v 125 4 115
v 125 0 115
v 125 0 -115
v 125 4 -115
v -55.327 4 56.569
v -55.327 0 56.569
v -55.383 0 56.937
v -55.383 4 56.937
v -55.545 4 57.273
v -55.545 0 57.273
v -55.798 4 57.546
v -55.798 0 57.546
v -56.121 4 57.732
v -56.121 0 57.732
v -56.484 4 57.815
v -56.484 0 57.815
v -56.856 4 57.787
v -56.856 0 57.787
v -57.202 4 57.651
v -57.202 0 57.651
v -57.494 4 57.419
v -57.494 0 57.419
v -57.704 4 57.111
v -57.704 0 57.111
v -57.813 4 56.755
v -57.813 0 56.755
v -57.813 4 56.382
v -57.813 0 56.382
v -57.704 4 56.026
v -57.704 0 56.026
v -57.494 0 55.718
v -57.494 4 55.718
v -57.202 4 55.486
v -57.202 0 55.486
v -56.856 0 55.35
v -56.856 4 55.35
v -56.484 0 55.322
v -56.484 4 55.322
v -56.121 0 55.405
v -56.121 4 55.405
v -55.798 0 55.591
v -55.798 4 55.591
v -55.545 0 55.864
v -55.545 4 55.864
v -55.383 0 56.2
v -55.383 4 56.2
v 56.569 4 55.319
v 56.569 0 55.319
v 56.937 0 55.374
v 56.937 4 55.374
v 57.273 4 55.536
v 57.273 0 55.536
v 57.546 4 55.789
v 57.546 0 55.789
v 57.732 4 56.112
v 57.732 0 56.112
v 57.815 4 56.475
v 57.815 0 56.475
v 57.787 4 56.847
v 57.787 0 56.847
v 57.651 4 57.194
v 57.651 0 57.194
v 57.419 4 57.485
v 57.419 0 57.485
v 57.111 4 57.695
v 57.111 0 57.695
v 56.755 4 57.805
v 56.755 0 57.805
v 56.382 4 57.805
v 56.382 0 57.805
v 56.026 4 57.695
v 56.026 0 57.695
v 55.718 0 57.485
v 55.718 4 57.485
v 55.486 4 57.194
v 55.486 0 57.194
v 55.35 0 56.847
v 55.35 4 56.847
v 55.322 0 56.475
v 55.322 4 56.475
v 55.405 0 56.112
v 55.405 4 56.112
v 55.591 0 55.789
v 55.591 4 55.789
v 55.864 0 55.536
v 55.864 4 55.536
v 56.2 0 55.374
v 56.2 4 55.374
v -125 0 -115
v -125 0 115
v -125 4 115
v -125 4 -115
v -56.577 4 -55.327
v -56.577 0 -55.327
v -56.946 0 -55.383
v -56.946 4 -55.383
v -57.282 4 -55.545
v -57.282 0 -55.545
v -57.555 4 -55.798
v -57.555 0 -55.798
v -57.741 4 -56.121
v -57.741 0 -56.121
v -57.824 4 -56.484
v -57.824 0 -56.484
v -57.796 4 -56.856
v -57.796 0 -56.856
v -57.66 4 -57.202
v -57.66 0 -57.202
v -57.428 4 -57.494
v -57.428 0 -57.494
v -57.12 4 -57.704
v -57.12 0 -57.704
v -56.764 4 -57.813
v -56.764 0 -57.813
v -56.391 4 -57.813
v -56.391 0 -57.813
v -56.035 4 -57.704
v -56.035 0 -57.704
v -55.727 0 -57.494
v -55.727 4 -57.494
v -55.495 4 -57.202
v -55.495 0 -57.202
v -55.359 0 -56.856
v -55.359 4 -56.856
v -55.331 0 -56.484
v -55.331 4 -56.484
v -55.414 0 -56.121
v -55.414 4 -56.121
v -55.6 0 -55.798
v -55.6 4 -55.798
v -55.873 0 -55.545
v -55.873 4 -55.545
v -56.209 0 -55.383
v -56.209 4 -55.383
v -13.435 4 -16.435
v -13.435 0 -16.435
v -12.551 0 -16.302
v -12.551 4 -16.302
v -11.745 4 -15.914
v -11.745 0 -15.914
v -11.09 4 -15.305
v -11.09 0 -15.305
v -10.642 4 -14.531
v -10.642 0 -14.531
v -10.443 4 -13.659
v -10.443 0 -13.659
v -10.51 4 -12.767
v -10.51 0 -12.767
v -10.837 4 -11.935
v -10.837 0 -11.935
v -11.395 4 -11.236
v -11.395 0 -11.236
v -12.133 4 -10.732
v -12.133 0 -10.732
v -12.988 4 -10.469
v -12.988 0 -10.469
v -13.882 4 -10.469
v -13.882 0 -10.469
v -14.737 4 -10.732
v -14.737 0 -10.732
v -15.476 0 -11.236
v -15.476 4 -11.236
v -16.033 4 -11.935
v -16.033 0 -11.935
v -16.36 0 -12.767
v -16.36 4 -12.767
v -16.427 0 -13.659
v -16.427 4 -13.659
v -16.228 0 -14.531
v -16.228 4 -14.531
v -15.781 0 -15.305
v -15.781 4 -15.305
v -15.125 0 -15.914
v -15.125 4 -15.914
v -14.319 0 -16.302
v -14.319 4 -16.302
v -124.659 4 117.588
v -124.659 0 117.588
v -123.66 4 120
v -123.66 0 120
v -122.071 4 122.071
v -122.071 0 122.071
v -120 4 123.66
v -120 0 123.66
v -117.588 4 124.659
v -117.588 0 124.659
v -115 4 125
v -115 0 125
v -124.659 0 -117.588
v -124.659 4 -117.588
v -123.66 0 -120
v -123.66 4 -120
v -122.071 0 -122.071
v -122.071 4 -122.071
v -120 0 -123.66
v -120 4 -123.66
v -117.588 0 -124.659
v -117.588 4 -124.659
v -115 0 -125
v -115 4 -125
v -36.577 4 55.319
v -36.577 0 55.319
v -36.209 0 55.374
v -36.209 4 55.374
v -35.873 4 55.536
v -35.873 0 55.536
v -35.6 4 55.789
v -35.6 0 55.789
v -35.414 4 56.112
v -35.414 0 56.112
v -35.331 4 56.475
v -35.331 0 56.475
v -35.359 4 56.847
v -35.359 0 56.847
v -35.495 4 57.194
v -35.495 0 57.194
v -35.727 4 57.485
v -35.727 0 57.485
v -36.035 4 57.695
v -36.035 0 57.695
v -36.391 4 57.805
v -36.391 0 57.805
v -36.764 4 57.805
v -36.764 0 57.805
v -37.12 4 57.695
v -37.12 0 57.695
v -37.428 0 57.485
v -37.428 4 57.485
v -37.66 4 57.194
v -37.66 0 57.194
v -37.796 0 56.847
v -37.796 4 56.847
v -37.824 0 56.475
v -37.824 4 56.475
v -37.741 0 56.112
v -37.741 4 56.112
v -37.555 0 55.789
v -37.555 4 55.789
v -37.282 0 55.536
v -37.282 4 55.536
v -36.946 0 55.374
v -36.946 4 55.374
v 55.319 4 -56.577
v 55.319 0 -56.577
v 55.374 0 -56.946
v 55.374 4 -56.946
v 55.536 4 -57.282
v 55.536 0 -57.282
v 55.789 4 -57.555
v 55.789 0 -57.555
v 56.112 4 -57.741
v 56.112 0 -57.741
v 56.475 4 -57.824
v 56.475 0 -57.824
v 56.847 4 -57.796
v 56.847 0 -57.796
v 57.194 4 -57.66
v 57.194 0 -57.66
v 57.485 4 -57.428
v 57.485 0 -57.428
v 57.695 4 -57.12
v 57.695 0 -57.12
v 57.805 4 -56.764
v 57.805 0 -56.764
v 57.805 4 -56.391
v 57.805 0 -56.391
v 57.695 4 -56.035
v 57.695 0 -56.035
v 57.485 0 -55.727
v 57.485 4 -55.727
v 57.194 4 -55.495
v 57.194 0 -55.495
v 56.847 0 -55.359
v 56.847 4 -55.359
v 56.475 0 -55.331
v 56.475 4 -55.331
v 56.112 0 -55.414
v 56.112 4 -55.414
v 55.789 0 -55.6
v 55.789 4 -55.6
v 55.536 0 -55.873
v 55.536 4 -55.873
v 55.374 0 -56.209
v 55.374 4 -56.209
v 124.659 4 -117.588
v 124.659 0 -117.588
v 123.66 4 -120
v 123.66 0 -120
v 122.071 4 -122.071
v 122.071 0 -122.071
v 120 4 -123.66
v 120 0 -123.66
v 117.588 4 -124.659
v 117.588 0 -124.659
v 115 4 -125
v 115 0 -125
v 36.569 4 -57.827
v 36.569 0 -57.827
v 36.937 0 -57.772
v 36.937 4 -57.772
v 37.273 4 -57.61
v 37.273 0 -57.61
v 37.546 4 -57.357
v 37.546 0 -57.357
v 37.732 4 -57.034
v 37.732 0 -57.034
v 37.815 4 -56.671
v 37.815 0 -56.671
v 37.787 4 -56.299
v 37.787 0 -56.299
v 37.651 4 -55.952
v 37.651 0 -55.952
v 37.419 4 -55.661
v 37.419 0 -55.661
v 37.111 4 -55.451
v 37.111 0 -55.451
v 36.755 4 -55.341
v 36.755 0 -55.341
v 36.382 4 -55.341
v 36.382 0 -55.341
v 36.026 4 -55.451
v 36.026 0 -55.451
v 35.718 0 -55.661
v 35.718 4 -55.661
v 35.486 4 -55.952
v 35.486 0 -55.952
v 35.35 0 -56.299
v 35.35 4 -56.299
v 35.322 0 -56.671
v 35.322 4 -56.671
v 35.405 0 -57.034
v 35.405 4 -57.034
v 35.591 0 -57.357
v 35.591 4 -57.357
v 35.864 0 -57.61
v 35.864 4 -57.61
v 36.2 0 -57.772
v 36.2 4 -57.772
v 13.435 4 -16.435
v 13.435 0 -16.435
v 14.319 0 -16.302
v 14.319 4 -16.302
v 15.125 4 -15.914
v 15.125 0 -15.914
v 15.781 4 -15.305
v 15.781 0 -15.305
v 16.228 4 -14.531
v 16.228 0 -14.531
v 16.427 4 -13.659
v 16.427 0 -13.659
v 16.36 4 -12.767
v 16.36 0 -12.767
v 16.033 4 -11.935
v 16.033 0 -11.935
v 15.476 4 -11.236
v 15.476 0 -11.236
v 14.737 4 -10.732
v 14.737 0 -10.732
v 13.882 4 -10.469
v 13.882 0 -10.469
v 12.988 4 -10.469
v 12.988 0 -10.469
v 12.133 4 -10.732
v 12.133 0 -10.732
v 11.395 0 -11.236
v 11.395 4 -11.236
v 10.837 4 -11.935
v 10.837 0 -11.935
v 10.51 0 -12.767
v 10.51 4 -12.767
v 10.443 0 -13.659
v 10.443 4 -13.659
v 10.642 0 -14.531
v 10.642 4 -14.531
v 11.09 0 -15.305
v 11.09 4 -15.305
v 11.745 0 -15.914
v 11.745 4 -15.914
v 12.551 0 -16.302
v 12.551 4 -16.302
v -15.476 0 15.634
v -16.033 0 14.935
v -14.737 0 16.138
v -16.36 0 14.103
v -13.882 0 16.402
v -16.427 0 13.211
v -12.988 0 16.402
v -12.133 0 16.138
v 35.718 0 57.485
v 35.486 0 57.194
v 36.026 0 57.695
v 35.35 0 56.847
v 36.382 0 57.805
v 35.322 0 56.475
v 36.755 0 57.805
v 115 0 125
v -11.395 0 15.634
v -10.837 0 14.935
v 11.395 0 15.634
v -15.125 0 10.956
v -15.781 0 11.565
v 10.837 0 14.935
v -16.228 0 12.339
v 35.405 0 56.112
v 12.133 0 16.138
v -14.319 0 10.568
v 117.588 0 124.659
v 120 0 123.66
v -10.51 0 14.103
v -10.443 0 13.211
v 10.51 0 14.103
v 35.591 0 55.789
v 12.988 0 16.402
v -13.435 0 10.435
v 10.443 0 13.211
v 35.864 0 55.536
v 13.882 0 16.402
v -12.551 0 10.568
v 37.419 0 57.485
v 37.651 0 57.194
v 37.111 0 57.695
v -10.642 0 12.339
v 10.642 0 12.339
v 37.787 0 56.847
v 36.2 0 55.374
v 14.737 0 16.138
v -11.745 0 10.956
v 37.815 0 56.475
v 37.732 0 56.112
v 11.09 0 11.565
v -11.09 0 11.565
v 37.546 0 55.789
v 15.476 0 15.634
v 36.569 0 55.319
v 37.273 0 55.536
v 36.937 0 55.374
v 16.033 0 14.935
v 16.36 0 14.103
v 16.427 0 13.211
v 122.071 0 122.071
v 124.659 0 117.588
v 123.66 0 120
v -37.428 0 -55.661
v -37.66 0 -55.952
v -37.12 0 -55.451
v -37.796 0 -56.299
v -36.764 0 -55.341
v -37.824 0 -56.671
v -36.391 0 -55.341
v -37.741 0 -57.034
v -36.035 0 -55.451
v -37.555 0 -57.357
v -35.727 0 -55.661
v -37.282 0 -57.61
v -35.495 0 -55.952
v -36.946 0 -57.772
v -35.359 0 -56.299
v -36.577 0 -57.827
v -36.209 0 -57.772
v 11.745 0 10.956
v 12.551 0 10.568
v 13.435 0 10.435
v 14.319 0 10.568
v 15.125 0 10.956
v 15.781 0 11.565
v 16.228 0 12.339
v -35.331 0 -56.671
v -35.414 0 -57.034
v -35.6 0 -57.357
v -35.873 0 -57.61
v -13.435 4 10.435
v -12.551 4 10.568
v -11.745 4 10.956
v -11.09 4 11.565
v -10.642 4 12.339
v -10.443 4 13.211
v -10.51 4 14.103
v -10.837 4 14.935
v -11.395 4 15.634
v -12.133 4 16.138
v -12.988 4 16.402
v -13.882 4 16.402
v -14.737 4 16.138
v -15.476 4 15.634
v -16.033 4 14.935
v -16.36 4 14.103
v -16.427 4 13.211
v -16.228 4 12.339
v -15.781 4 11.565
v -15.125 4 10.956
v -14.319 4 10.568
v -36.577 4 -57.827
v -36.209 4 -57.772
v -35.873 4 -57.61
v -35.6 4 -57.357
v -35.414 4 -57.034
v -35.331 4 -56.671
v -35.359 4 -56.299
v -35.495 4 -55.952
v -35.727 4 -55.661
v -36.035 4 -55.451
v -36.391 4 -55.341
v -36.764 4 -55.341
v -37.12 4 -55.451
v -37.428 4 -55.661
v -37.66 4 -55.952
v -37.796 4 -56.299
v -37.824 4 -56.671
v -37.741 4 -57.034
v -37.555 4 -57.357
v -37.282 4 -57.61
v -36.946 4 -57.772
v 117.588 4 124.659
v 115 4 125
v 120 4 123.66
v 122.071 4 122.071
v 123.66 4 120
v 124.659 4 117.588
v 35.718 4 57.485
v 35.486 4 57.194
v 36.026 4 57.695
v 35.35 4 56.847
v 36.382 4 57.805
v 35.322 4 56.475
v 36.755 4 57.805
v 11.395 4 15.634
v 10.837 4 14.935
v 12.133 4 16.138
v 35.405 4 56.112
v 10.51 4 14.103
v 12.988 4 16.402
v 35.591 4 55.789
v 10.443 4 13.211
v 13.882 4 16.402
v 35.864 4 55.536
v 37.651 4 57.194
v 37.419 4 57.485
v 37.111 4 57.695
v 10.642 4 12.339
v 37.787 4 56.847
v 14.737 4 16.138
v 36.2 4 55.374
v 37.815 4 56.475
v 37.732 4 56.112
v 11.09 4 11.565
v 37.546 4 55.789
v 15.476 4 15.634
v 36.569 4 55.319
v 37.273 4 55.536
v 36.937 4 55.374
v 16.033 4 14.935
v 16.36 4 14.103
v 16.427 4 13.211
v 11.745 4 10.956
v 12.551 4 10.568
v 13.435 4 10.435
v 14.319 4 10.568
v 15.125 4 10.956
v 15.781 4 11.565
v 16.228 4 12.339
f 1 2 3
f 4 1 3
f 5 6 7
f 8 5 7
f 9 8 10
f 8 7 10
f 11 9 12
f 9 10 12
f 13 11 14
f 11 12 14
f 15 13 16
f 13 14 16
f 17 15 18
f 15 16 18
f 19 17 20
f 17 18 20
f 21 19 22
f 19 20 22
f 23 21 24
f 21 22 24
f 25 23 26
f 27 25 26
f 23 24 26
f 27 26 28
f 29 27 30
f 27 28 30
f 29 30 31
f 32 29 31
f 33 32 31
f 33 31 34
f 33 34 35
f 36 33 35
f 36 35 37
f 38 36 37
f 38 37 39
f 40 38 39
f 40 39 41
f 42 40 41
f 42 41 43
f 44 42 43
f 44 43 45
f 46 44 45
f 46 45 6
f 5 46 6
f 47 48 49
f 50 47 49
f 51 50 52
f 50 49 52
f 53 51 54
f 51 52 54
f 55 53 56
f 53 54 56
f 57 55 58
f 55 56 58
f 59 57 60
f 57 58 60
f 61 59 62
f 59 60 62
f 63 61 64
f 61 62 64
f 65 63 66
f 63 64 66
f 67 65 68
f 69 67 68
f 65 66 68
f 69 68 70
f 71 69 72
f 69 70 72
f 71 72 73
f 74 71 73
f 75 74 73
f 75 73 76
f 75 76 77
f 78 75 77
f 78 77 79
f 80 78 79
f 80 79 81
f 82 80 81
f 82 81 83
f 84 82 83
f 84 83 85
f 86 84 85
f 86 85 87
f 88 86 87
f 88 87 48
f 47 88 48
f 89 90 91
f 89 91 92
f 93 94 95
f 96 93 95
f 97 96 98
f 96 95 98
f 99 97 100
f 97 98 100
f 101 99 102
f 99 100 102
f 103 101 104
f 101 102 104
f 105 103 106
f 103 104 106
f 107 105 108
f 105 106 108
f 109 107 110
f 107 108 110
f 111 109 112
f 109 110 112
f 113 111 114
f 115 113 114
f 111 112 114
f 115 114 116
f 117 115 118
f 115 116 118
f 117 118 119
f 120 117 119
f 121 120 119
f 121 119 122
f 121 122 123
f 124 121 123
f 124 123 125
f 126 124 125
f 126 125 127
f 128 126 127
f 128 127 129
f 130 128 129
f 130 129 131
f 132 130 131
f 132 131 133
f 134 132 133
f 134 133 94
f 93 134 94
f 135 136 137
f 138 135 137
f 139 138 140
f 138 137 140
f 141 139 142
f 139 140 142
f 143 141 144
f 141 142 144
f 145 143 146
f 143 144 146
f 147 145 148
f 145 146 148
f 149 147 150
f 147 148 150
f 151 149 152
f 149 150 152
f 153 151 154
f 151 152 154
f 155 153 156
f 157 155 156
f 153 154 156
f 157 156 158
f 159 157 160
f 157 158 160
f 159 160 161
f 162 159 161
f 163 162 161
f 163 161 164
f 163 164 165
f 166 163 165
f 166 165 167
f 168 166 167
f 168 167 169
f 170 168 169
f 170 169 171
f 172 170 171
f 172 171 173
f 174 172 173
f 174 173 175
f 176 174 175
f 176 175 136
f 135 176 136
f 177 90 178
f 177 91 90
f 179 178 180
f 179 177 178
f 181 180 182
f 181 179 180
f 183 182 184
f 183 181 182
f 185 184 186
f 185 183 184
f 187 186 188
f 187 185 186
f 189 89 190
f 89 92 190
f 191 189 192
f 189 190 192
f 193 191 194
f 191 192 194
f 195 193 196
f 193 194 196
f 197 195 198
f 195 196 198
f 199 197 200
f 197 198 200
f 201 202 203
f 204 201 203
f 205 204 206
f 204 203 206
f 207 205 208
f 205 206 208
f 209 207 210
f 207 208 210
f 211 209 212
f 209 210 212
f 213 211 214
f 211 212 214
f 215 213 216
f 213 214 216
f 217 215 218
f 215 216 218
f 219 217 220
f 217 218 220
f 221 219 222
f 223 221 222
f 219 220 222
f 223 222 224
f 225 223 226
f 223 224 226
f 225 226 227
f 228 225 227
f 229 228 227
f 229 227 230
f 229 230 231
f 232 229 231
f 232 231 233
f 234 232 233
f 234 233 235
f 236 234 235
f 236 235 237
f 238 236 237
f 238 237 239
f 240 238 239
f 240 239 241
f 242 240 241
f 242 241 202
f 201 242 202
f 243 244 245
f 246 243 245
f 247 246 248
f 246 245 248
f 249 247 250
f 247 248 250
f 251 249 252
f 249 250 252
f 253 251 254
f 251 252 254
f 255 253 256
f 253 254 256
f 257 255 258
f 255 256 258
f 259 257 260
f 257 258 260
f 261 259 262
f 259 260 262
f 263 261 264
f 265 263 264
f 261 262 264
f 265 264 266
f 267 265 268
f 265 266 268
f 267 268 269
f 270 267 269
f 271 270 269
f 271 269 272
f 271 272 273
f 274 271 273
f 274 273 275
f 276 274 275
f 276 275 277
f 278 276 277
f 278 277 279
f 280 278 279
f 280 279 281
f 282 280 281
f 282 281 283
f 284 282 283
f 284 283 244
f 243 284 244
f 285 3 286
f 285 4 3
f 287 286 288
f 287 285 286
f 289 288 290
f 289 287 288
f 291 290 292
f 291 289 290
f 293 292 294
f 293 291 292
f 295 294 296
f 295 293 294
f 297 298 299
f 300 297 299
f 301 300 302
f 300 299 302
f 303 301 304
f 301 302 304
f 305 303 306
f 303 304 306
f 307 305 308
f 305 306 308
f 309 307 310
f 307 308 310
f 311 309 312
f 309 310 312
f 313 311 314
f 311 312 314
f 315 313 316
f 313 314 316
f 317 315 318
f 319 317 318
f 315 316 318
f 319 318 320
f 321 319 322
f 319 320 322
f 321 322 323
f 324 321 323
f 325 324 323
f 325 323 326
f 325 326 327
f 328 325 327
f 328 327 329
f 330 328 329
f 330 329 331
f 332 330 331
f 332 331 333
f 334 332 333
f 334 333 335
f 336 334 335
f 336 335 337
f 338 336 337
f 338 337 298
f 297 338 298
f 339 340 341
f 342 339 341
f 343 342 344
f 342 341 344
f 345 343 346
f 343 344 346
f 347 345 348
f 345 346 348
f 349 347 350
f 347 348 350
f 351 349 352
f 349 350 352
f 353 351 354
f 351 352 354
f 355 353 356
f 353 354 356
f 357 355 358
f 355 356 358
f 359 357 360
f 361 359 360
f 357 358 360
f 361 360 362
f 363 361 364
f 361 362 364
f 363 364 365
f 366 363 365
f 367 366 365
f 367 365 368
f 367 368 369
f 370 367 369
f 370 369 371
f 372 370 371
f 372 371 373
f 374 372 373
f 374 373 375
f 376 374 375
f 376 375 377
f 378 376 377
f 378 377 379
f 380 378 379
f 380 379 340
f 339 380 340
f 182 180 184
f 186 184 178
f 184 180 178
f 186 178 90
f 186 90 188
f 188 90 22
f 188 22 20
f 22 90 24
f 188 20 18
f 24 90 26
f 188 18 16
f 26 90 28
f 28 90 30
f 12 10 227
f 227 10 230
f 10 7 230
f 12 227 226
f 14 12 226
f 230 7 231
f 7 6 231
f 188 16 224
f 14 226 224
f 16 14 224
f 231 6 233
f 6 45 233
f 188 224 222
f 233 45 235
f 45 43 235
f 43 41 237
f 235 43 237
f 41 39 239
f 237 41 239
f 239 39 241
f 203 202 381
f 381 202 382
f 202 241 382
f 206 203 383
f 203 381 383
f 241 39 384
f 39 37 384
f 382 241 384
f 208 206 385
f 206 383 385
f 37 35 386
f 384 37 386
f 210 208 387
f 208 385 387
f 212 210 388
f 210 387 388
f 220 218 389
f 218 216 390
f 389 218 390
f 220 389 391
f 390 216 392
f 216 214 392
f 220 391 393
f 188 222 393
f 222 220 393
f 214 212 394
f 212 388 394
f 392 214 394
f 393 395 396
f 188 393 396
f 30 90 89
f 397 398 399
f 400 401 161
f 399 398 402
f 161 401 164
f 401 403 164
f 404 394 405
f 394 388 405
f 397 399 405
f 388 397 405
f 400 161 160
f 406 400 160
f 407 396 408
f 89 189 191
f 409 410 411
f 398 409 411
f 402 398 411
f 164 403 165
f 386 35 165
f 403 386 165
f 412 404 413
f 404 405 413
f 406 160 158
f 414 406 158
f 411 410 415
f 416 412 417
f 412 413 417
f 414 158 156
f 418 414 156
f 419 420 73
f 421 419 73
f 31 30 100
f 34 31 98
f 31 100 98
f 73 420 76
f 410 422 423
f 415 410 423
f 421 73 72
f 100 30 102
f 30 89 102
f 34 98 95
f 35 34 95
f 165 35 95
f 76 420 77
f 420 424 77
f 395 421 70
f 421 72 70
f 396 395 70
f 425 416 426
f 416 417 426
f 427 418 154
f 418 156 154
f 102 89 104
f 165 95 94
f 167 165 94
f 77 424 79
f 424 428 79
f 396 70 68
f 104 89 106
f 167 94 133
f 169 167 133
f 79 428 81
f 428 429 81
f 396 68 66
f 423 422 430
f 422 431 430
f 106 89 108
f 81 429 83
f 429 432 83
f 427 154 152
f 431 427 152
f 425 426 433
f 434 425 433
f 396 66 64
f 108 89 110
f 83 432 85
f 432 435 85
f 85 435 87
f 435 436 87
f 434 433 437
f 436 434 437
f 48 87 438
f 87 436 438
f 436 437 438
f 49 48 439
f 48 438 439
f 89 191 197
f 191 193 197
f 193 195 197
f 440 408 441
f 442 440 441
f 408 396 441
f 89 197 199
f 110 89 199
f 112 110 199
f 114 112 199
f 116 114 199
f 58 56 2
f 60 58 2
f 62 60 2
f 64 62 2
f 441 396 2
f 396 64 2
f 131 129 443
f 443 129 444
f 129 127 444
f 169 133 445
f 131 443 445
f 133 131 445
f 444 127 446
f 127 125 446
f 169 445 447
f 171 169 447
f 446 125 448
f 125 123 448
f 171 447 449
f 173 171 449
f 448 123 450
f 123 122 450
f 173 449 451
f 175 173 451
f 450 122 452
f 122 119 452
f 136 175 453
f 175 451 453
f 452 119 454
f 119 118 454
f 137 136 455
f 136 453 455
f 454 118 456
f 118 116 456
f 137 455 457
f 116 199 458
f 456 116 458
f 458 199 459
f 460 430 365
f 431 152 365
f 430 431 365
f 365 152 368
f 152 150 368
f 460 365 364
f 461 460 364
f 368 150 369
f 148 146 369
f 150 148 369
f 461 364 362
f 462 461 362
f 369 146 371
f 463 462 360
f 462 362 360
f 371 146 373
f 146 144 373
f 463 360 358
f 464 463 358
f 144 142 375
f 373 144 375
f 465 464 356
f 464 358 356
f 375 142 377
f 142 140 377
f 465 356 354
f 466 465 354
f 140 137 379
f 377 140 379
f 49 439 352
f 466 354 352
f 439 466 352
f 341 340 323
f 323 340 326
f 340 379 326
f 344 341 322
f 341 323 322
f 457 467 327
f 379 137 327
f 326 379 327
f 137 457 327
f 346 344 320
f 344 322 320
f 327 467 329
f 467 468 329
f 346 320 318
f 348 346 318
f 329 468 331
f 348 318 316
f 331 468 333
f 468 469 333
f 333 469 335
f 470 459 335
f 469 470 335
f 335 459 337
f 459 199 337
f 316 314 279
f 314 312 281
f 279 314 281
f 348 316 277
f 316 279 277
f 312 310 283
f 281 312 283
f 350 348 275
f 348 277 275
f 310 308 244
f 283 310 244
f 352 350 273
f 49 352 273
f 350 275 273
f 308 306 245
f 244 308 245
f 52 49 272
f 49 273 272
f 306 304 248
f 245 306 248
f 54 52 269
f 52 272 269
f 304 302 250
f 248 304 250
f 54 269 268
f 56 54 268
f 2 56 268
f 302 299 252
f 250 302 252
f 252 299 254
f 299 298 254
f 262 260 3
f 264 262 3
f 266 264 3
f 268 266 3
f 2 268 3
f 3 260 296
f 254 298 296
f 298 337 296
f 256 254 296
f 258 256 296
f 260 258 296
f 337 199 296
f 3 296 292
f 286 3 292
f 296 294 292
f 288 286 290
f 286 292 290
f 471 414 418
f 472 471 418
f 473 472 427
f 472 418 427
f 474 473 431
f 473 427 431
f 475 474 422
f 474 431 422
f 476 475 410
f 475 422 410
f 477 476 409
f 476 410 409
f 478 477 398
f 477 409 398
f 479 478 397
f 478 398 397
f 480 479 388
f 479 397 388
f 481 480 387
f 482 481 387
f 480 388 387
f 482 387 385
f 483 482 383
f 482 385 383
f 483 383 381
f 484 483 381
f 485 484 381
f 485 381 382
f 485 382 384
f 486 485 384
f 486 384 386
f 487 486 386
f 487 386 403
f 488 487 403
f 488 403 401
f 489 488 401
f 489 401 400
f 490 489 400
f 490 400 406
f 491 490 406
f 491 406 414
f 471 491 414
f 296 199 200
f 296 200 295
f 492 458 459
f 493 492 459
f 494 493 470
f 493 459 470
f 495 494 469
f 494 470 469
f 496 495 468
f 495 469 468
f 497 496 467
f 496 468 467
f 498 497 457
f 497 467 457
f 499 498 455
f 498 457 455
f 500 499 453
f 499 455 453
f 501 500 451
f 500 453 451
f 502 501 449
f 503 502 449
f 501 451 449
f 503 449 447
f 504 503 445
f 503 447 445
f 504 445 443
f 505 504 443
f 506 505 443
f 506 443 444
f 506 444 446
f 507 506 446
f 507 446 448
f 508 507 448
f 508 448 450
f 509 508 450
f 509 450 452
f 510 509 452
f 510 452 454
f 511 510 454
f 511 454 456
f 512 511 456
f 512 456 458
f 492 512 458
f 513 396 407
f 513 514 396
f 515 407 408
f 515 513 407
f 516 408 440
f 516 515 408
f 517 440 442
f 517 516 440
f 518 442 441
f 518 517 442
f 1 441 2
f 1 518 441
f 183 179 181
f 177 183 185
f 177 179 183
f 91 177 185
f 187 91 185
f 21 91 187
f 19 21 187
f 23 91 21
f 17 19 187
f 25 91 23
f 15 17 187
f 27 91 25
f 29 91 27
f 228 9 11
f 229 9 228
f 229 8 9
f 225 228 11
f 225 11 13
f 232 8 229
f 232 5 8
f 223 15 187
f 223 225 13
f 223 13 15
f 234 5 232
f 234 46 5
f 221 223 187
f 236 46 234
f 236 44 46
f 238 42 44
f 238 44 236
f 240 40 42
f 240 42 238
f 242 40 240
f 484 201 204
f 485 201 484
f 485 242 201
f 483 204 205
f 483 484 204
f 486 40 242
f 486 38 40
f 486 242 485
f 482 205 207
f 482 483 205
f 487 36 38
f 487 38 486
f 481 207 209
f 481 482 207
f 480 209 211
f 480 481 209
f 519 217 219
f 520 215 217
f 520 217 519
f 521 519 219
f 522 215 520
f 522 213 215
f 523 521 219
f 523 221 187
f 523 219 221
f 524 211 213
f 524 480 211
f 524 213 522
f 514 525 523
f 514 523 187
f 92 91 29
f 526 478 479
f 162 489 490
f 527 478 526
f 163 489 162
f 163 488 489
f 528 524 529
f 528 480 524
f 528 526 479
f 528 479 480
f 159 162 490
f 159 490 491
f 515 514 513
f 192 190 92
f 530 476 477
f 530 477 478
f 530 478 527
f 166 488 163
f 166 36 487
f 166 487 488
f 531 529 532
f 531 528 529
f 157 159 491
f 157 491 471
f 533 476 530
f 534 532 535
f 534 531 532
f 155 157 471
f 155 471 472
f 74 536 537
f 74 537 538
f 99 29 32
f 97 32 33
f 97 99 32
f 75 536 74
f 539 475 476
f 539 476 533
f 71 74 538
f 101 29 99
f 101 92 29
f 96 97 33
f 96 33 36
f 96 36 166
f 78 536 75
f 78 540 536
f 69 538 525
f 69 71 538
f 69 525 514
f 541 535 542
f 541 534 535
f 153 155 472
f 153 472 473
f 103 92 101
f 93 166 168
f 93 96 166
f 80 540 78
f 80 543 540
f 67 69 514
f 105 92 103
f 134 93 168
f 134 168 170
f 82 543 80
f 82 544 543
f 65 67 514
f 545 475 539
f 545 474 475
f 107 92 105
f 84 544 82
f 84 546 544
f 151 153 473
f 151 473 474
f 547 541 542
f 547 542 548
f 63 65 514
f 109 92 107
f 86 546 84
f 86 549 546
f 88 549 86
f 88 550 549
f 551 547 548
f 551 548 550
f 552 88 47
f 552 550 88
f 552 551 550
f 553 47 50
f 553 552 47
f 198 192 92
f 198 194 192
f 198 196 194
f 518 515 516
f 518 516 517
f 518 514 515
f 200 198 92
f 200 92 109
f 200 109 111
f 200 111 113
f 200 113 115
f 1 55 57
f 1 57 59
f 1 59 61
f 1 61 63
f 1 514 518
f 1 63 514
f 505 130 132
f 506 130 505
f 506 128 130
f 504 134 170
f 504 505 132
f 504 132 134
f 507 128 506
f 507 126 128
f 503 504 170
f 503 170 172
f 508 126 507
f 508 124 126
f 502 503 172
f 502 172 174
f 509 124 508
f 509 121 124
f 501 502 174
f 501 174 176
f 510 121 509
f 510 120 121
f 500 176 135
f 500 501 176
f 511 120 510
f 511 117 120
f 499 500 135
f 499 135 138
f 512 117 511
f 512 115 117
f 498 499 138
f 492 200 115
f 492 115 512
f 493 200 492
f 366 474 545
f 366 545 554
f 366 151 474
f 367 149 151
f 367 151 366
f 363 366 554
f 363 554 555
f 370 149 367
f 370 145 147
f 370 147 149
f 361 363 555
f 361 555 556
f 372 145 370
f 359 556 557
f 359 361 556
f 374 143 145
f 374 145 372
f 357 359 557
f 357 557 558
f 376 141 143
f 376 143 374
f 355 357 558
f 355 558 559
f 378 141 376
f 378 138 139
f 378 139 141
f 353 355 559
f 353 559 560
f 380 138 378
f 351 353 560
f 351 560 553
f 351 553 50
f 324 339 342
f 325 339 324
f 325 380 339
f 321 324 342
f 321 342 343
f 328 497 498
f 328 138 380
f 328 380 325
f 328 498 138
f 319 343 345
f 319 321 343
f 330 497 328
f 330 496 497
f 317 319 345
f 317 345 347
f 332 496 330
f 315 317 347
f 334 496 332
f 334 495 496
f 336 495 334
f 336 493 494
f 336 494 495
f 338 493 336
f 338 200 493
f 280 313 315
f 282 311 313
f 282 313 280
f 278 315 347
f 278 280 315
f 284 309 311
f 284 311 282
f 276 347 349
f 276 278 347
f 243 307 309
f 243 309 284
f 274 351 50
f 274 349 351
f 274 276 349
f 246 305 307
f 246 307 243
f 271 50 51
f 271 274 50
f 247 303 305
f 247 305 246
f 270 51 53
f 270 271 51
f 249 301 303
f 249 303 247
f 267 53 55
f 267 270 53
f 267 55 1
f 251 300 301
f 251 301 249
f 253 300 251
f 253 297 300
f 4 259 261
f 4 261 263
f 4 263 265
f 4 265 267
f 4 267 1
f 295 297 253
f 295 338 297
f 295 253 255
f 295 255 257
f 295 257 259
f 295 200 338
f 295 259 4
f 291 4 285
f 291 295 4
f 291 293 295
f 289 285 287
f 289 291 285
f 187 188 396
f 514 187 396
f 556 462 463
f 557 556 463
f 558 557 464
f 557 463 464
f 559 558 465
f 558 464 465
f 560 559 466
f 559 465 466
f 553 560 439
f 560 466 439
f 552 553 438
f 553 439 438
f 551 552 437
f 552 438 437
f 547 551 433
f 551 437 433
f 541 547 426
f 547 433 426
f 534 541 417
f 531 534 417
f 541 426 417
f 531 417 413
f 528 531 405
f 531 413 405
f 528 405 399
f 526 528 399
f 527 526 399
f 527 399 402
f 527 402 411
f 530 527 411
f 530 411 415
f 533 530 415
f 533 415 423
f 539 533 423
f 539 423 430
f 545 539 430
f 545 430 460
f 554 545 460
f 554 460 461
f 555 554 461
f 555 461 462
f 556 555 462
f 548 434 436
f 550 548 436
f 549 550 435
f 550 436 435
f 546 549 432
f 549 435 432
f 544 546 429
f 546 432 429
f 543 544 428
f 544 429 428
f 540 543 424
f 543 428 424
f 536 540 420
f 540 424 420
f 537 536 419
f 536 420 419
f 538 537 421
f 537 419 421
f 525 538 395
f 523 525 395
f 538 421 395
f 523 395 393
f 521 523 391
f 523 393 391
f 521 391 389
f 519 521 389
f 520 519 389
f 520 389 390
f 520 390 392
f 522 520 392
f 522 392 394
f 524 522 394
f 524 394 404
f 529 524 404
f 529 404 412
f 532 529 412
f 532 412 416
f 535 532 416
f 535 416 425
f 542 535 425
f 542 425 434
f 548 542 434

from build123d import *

# Parameters (mm, degrees)
SKETCH_1_W               = 250
SKETCH_1_H               = 250
EXTRUDE_1_DEPTH          = 4
FILLET_1_R               = 10
SKETCH_3_R               = 1.25
CUT_EXTRUDE_4_DEPTH      = 177.821944339
PATTERN_CIRCULAR_2_COUNT = 4
SKETCH_7_R               = 1.25
CUT_EXTRUDE_11_DEPTH     = 10
SKETCH_9_R               = 3
CUT_EXTRUDE_12_DEPTH     = 10


with BuildPart() as part:
    # 草图1 → 凸台-拉伸1 (new body)
    with BuildSketch(Plane(origin=(0, 0, 0), x_dir=(1, 0, 0), z_dir=(0, 1, 0))):
        Rectangle(SKETCH_1_W, SKETCH_1_H)
    extrude(amount=EXTRUDE_1_DEPTH)

    # 圆角1
    fillet_1_edges = [part.edges().sort_by_distance(p)[0] for p in [
        (125, 2, 125),
        (-125, 2, 125),
        (-125, 2, -125),
        (125, 2, -125),
    ]]
    fillet(fillet_1_edges, radius=FILLET_1_R)

    # 草图3 → 切除-拉伸4 (cut, through all)
    with BuildSketch(Plane.XZ):
        with Locations(Location((56.568542495, 56.568542495, 0), (0, 0, 270))):
            Circle(SKETCH_3_R)
    cut_extrude_4 = extrude(amount=-CUT_EXTRUDE_4_DEPTH, mode=Mode.SUBTRACT)

    # 阵列(圆周)2: 切除-拉伸4 ×4 about axis
    pattern_circular_2_axis = Axis((-0.004449343, 0, -0.004449343), (0, 1, 0))
    for i in range(1, PATTERN_CIRCULAR_2_COUNT):
        add(cut_extrude_4.rotate(pattern_circular_2_axis, i * 360 / PATTERN_CIRCULAR_2_COUNT), mode=Mode.SUBTRACT)

    # 草图7 → 切除-拉伸11 (cut)
    with BuildSketch(Plane.XZ):
        with Locations(Location((-36.577441182, -56.577441182, 0), (0, 0, 270))):
            Circle(SKETCH_7_R)
        with Locations(Location((36.568542495, -56.577441182, 0), (0, 0, 270))):
            Circle(SKETCH_7_R)
        with Locations(Location((-36.577441182, 56.568542495, 0), (0, 0, 270))):
            Circle(SKETCH_7_R)
        with Locations(Location((36.568542495, 56.568542495, 0), (0, 0, 270))):
            Circle(SKETCH_7_R)
    extrude(amount=-CUT_EXTRUDE_11_DEPTH, mode=Mode.SUBTRACT)

    # 草图9 → 切除-拉伸12 (cut)
    with BuildSketch(Plane.XZ):
        with Locations(Location((13.435028843, 13.435028843, 0), (0, 0, 270))):
            Circle(SKETCH_9_R)
        with Locations(Location((13.435028843, -13.435028843, 0), (0, 0, 270))):
            Circle(SKETCH_9_R)
        with Locations(Location((-13.435028843, -13.435028843, 0), (0, 0, 270))):
            Circle(SKETCH_9_R)
        with Locations(Location((-13.435028843, 13.435028843, 0), (0, 0, 270))):
            Circle(SKETCH_9_R)
    extrude(amount=-CUT_EXTRUDE_12_DEPTH, mode=Mode.SUBTRACT)


solid = part.part
